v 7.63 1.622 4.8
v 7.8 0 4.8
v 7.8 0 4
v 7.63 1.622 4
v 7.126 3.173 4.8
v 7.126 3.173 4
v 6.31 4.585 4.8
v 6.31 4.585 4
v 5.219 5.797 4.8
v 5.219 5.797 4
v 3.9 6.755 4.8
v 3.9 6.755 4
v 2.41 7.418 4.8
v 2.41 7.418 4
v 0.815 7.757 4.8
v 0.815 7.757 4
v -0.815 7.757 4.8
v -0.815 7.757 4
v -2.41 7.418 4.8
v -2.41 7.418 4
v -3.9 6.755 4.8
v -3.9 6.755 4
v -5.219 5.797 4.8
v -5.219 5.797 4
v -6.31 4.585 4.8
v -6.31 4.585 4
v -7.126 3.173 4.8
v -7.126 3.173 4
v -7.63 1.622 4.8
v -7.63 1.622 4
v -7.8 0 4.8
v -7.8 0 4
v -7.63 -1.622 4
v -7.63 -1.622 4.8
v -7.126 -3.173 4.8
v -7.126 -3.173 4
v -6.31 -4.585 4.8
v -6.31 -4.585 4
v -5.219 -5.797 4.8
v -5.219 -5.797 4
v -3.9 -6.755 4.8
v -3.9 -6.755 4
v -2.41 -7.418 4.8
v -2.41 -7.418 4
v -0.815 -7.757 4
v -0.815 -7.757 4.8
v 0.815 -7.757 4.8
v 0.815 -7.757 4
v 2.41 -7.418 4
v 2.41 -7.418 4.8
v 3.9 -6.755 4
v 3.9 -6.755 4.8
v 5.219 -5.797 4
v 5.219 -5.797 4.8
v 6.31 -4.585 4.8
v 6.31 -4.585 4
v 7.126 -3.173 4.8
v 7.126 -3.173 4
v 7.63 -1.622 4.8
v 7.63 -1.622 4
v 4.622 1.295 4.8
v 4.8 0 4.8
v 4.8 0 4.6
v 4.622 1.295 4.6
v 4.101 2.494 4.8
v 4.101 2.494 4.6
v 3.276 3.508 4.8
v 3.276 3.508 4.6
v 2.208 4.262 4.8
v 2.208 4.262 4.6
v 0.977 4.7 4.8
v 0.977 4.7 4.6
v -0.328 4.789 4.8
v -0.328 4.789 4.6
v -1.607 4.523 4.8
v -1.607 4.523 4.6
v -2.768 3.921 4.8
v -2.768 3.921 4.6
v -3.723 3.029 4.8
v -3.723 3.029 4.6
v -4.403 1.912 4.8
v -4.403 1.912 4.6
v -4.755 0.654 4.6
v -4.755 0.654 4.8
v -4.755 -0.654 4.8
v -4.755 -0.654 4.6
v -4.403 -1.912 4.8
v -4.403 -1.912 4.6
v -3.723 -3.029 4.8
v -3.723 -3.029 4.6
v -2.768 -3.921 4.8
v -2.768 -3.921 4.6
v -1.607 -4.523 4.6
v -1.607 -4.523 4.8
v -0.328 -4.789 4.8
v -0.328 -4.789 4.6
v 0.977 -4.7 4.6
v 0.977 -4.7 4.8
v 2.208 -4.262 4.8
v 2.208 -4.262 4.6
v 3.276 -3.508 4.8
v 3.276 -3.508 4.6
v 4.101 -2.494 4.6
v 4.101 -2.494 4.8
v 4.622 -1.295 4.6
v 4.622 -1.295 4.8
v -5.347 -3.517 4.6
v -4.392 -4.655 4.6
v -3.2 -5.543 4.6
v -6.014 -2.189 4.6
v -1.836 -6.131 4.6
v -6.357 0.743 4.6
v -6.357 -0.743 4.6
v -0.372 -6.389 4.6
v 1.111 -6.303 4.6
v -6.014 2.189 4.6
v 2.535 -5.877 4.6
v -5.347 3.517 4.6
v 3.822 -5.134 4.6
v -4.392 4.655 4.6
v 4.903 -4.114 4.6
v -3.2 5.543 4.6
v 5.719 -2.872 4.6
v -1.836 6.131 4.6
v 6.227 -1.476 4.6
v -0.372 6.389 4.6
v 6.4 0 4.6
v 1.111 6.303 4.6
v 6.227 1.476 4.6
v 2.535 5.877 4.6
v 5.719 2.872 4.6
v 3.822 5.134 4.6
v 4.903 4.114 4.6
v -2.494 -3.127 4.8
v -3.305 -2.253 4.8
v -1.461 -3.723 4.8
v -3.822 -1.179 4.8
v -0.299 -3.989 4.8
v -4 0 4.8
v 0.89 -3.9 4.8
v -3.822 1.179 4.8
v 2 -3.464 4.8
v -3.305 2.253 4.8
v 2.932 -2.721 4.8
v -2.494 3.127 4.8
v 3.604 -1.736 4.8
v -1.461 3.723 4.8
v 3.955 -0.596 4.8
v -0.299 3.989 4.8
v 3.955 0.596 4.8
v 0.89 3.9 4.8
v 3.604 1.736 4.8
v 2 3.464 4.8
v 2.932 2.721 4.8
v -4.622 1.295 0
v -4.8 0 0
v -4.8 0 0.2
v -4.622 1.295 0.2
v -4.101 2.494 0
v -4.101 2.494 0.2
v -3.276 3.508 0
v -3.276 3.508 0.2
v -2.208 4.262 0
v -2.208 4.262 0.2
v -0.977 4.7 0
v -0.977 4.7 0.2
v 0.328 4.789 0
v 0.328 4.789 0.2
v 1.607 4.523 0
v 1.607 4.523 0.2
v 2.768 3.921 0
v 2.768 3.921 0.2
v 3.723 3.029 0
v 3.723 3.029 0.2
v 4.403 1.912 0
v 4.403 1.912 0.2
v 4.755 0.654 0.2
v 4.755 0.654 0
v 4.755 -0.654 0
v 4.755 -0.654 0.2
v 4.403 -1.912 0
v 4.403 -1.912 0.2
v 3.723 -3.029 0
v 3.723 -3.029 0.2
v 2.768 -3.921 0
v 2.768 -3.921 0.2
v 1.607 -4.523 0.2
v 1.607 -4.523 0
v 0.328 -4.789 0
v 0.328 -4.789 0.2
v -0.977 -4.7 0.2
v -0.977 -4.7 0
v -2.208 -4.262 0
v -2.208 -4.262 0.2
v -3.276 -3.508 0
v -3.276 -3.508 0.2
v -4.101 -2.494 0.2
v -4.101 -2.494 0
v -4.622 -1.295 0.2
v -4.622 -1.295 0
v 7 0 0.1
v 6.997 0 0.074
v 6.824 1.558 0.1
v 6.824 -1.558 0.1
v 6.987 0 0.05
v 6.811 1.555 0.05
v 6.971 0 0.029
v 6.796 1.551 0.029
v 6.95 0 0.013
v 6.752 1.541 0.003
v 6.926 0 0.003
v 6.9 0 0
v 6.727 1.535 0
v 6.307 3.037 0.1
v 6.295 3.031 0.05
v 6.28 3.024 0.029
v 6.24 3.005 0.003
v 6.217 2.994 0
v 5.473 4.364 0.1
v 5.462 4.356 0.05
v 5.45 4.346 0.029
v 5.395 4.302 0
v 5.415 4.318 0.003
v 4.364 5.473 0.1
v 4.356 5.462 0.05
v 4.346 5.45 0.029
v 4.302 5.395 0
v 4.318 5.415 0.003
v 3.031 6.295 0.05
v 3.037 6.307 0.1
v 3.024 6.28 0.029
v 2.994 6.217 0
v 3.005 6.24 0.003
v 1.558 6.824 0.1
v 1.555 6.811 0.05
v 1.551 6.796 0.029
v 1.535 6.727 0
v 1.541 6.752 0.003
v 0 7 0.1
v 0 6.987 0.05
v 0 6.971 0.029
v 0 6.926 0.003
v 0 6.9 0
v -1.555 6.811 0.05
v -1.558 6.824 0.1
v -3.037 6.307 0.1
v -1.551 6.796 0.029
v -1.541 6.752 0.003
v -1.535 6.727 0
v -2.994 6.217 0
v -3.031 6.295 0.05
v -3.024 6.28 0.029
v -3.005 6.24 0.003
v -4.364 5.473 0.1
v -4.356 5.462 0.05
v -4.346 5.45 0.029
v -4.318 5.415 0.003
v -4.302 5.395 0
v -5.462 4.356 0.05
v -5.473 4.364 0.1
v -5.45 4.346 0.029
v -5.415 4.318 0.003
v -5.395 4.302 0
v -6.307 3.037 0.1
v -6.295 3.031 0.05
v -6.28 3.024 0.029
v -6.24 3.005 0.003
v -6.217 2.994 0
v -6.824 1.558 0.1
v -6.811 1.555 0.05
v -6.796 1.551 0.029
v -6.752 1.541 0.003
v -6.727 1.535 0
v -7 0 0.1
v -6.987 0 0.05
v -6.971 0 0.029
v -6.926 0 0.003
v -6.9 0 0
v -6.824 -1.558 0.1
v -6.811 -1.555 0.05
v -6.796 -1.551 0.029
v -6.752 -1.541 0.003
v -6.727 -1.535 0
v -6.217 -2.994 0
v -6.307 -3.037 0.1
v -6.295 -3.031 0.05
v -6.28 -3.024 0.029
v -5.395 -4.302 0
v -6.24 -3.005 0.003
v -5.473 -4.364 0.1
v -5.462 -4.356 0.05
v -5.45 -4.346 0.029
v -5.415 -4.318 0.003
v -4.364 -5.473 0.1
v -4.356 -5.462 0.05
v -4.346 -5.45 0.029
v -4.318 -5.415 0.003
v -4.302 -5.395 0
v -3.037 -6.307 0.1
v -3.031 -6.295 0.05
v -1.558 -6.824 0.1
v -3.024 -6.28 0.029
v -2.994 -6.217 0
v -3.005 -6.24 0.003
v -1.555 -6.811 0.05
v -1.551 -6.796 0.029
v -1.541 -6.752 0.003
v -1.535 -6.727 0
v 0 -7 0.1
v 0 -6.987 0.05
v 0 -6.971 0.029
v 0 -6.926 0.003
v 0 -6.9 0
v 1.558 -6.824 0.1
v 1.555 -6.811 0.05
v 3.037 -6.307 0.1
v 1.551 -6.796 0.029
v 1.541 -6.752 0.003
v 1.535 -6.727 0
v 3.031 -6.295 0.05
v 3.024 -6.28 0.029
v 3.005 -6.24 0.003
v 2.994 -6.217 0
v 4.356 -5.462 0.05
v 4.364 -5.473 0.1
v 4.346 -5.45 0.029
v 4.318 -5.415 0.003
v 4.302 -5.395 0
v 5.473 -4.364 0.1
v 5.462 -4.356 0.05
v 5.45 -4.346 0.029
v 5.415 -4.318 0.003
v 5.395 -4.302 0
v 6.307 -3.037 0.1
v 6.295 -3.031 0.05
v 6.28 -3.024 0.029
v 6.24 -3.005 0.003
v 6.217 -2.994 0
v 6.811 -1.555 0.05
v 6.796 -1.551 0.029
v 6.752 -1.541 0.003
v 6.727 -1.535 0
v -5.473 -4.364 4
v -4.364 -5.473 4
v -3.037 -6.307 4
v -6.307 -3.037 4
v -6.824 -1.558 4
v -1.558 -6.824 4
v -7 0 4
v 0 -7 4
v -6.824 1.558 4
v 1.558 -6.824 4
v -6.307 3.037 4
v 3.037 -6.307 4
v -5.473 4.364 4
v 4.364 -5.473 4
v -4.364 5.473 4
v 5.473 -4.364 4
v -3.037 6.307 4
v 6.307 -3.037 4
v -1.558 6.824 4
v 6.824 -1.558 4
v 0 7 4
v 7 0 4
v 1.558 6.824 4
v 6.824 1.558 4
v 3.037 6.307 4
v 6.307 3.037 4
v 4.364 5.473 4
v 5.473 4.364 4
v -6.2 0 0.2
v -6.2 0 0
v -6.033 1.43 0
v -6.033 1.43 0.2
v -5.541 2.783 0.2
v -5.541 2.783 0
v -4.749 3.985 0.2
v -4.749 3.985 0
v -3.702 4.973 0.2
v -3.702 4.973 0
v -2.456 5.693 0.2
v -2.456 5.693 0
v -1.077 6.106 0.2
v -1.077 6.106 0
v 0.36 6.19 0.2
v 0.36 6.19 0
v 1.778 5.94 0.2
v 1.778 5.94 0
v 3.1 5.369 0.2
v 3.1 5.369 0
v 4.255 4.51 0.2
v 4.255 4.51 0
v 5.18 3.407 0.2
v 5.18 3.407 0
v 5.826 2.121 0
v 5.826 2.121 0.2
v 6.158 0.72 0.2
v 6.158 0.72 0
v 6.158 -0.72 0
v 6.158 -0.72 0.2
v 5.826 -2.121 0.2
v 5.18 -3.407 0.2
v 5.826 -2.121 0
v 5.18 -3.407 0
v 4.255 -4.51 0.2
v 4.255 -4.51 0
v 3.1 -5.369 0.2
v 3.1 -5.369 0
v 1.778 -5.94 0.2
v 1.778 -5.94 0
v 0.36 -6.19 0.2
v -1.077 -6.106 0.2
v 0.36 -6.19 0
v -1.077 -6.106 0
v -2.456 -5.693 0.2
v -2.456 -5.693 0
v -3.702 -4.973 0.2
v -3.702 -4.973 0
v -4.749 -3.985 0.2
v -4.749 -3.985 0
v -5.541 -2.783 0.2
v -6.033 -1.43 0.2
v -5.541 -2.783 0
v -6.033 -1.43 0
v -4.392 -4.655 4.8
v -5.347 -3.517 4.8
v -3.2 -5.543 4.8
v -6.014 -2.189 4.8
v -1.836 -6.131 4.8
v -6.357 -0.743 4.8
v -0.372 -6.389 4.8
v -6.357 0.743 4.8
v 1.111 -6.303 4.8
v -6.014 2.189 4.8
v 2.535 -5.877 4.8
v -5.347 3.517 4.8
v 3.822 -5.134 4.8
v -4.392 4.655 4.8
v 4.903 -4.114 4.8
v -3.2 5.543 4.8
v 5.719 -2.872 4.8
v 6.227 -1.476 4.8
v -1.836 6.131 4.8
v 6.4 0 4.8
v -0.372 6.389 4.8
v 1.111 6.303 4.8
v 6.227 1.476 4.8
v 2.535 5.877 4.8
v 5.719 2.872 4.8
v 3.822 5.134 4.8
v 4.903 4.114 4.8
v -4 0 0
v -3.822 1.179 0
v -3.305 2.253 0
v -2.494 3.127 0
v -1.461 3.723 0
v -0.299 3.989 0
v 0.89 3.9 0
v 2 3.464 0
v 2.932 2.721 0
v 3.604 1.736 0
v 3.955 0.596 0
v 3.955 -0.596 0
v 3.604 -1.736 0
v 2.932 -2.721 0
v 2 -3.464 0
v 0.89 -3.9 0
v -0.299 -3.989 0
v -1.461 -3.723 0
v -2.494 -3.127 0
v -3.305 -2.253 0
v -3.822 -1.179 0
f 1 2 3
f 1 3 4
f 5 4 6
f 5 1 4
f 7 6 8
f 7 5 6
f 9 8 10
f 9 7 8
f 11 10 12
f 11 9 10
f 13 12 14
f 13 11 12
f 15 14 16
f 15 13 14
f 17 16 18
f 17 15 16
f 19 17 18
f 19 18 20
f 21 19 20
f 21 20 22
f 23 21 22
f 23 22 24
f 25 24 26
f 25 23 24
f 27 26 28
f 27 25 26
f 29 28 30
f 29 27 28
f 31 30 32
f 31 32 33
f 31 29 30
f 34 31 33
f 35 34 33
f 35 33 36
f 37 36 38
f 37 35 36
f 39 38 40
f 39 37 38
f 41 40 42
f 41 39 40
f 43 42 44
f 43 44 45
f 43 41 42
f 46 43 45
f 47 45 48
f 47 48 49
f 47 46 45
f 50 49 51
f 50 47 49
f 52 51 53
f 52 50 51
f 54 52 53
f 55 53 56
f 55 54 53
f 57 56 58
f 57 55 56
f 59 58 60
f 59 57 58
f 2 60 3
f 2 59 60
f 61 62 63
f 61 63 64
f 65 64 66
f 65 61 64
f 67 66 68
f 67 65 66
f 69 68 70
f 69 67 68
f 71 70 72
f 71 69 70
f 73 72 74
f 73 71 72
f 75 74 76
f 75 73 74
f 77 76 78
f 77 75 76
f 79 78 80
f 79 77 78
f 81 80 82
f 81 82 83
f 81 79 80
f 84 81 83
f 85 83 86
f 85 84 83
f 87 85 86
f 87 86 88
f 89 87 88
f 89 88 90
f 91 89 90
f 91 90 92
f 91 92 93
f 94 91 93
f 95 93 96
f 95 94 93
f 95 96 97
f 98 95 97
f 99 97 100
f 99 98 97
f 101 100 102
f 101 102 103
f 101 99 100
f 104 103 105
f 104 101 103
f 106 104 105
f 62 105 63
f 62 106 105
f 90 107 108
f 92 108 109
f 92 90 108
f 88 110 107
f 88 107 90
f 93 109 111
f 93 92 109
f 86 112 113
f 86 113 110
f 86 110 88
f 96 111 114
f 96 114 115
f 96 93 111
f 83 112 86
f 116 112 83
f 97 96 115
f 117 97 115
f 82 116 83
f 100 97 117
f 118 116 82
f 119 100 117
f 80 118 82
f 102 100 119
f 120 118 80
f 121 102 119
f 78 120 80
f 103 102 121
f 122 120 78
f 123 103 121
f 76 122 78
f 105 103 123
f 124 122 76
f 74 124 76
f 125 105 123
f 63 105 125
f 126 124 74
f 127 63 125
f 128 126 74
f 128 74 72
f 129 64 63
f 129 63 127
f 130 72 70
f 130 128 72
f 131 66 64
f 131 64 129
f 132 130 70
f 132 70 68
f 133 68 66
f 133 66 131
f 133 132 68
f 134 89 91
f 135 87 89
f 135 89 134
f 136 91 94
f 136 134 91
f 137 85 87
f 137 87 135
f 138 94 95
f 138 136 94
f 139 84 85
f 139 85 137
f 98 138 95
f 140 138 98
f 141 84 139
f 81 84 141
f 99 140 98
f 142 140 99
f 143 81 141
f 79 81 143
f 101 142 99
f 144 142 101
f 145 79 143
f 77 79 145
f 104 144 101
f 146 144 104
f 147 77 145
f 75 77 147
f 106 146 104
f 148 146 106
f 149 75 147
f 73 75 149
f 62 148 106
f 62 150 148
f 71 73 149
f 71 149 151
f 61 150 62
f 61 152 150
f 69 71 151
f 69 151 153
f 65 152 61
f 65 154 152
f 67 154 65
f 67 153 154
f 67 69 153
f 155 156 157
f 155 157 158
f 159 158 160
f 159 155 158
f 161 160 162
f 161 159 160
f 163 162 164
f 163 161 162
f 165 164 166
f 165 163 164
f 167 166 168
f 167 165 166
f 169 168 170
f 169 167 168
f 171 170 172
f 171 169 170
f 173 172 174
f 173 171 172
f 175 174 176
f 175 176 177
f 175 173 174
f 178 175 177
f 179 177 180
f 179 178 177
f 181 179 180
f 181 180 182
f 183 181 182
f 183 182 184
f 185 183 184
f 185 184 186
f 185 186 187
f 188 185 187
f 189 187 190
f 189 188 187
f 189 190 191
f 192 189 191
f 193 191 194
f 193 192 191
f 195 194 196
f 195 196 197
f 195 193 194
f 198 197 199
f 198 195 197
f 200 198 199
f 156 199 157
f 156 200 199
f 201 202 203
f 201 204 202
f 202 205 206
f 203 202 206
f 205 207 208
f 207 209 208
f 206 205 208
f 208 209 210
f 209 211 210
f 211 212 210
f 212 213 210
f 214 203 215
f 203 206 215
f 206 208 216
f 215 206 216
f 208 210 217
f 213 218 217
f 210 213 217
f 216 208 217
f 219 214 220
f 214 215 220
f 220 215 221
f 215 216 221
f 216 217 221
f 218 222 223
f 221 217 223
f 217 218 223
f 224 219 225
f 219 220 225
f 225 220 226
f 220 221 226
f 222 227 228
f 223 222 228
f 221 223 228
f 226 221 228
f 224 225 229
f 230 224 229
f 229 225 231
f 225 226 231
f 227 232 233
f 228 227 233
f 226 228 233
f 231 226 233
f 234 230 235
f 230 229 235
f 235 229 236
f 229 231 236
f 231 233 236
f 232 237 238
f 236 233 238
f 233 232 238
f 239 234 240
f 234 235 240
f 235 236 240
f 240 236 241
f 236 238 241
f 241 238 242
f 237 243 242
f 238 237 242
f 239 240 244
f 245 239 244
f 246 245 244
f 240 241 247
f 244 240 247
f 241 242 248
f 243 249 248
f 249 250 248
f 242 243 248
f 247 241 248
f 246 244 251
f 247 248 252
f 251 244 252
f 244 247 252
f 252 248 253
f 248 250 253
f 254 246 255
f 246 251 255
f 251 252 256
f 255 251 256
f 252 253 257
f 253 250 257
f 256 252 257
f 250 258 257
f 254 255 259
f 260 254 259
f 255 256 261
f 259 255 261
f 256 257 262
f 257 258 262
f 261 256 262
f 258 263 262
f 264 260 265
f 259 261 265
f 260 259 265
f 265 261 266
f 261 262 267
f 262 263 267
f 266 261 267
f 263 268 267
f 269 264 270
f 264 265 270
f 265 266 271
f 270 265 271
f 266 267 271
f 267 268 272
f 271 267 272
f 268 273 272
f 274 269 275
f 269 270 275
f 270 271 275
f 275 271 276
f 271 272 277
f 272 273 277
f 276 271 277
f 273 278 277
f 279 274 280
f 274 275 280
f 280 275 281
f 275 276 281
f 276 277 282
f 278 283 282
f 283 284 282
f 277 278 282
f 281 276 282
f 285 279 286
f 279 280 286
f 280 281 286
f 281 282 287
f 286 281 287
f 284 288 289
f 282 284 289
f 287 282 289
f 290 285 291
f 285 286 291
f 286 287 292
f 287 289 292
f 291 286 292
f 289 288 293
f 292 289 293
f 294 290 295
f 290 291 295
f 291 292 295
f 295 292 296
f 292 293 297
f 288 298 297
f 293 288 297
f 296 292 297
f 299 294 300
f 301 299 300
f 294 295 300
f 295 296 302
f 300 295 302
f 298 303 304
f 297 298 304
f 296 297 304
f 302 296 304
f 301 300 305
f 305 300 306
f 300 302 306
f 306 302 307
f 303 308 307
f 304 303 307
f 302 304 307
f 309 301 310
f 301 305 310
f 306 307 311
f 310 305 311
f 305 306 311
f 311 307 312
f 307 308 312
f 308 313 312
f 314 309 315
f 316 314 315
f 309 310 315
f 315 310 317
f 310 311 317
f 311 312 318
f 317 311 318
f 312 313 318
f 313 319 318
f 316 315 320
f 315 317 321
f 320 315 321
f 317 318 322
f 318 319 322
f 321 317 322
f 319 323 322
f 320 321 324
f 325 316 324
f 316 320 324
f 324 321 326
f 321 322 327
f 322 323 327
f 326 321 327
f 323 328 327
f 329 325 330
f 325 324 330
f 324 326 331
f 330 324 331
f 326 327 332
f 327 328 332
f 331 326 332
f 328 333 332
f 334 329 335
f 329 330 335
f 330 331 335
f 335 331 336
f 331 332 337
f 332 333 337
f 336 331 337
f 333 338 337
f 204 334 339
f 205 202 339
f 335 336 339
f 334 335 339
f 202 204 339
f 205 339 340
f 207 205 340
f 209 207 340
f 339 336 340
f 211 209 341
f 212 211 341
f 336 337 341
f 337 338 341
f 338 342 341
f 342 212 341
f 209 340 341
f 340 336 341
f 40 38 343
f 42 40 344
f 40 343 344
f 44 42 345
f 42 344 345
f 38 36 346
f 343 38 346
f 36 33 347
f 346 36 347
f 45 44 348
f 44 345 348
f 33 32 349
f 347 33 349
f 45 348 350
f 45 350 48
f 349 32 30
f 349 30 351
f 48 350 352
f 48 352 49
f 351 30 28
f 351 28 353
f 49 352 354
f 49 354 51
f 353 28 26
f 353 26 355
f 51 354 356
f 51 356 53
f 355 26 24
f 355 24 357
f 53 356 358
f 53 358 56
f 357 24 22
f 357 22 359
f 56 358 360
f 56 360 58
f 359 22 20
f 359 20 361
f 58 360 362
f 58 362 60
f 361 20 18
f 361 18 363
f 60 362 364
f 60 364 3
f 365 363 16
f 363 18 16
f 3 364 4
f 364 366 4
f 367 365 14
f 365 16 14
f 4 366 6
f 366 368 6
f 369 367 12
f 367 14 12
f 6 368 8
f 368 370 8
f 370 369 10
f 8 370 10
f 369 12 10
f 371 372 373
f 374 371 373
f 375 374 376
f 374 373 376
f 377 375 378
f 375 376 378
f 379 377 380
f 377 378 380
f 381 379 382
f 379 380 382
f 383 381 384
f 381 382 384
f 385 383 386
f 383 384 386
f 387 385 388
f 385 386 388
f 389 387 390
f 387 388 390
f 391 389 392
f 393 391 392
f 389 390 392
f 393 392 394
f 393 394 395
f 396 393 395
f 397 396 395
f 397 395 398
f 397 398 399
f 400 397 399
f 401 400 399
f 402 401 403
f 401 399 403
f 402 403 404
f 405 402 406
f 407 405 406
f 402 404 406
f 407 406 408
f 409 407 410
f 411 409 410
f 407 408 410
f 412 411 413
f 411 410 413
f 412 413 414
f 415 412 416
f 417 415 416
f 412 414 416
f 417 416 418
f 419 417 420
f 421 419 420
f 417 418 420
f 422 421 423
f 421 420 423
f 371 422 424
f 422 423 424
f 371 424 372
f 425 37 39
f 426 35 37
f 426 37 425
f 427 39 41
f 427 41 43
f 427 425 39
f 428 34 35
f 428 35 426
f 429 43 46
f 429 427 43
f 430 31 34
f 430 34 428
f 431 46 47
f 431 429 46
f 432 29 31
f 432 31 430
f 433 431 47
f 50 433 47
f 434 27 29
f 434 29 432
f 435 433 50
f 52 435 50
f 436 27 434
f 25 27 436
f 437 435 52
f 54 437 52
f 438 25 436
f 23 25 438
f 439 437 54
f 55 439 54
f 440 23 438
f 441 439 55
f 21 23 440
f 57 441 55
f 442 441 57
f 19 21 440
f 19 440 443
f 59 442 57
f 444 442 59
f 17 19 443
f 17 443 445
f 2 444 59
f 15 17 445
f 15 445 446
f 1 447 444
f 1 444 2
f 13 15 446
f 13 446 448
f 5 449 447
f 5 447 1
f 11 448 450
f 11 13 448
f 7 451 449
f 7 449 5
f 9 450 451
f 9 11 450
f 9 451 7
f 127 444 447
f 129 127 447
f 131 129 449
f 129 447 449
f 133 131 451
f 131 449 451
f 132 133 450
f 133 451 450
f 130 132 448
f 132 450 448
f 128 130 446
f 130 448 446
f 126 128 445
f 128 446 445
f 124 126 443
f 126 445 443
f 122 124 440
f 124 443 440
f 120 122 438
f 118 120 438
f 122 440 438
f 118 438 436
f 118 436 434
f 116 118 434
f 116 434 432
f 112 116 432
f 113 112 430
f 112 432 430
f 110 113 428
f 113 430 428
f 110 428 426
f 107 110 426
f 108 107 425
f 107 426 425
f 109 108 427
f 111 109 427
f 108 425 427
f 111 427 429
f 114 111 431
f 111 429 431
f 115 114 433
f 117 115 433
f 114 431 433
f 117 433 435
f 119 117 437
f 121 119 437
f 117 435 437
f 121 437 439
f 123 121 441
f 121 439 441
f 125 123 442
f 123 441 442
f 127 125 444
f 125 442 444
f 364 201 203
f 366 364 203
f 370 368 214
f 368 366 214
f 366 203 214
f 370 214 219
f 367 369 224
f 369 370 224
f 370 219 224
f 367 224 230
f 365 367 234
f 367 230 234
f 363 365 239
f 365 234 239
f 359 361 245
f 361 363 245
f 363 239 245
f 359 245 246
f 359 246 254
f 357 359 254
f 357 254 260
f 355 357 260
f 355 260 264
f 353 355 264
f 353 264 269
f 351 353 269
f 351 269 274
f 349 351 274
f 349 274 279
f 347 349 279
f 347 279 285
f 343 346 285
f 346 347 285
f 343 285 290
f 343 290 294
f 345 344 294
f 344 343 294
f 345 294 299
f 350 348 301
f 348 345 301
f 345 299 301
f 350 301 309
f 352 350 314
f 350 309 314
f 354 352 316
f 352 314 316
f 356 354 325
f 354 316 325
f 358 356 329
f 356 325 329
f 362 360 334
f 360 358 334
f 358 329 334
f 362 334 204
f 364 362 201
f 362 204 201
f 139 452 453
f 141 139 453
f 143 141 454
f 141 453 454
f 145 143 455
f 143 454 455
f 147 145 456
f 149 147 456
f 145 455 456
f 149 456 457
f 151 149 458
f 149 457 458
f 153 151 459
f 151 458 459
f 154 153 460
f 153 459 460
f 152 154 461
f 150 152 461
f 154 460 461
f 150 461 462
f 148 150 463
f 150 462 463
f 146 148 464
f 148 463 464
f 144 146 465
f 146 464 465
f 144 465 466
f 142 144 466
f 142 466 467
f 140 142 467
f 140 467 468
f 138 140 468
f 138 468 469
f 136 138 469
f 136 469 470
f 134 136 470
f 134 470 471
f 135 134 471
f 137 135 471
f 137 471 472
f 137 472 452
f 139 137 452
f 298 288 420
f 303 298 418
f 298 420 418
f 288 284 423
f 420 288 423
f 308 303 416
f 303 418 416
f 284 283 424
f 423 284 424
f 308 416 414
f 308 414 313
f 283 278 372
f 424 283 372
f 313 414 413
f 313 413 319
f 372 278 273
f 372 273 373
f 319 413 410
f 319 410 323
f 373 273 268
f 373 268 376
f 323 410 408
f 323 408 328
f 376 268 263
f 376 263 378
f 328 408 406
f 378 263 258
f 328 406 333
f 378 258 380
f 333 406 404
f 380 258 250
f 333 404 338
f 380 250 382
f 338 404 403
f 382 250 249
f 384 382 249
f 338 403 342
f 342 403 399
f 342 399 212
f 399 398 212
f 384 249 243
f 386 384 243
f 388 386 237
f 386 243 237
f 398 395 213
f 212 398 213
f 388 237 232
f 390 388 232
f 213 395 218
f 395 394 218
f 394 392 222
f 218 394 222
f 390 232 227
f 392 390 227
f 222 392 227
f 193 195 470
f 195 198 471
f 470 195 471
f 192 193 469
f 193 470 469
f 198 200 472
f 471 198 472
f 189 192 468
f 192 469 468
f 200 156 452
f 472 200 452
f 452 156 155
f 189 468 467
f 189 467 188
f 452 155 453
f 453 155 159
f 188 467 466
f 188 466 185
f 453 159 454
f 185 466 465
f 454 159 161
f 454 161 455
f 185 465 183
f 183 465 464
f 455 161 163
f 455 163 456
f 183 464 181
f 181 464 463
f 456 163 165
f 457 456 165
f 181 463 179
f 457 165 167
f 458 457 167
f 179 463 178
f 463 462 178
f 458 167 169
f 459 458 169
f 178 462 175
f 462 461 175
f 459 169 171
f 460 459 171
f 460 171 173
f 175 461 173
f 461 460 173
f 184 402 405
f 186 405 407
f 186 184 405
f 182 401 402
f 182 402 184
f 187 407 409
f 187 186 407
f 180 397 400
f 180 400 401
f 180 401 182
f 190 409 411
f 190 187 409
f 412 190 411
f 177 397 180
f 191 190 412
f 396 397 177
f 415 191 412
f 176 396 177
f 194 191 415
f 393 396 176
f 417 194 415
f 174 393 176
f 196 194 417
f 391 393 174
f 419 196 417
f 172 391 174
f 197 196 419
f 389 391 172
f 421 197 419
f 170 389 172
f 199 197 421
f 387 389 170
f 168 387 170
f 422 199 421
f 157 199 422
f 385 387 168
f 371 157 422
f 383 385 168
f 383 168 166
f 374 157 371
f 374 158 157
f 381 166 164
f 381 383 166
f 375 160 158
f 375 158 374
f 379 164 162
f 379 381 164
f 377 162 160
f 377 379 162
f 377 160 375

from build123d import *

# Parameters (mm, degrees)
SKETCH_1_R          = 7
EXTRUDE_1_DEPTH     = 4.8
SKETCH_2_R          = 7.8
EXTRUDE_2_DEPTH     = 0.8
SKETCH_3_R          = 4
CUT_EXTRUDE_1_DEPTH = 5.8
SKETCH_4_R          = 6.2
SKETCH_4_R_2        = 4.8
CUT_EXTRUDE_2_DEPTH = 0.2
SKETCH_5_R          = 6.4
SKETCH_5_R_2        = 4.8
CUT_EXTRUDE_3_DEPTH = 0.2
FILLET_1_R          = 0.1


with BuildPart() as part:
    # 草圖1 → 填料-伸長1 (new body)
    with BuildSketch(Plane.XY):
        Circle(SKETCH_1_R)
    extrude(amount=EXTRUDE_1_DEPTH)

    # 草圖2 → 填料-伸長2 (add)
    with BuildSketch(Plane.XY.offset(4.8)):
        Circle(SKETCH_2_R)
    extrude(amount=-EXTRUDE_2_DEPTH)

    # 草圖3 → 除料-伸長1 (cut, through all)
    with BuildSketch(Plane(origin=(0, 0, 0), x_dir=(-1, 0, 0), z_dir=(0, 0, -1))):
        Circle(SKETCH_3_R)
    extrude(amount=-CUT_EXTRUDE_1_DEPTH, mode=Mode.SUBTRACT)

    # 草圖4 → 除料-伸長2 (cut)
    with BuildSketch(Plane(origin=(0, 0, 0), x_dir=(-1, 0, 0), z_dir=(0, 0, -1))):
        Circle(SKETCH_4_R)
        Circle(SKETCH_4_R_2, mode=Mode.SUBTRACT)
    extrude(amount=-CUT_EXTRUDE_2_DEPTH, mode=Mode.SUBTRACT)

    # 草圖5 → 除料-伸長3 (cut)
    with BuildSketch(Plane.XY.offset(4.8)):
        Circle(SKETCH_5_R)
        Circle(SKETCH_5_R_2, mode=Mode.SUBTRACT)
    extrude(amount=-CUT_EXTRUDE_3_DEPTH, mode=Mode.SUBTRACT)

    # 圓角1
    fillet_1_edges = [part.edges().sort_by_distance(p)[0] for p in [
        (-7, 0, 0),
    ]]
    fillet(fillet_1_edges, radius=FILLET_1_R)


solid = part.part
